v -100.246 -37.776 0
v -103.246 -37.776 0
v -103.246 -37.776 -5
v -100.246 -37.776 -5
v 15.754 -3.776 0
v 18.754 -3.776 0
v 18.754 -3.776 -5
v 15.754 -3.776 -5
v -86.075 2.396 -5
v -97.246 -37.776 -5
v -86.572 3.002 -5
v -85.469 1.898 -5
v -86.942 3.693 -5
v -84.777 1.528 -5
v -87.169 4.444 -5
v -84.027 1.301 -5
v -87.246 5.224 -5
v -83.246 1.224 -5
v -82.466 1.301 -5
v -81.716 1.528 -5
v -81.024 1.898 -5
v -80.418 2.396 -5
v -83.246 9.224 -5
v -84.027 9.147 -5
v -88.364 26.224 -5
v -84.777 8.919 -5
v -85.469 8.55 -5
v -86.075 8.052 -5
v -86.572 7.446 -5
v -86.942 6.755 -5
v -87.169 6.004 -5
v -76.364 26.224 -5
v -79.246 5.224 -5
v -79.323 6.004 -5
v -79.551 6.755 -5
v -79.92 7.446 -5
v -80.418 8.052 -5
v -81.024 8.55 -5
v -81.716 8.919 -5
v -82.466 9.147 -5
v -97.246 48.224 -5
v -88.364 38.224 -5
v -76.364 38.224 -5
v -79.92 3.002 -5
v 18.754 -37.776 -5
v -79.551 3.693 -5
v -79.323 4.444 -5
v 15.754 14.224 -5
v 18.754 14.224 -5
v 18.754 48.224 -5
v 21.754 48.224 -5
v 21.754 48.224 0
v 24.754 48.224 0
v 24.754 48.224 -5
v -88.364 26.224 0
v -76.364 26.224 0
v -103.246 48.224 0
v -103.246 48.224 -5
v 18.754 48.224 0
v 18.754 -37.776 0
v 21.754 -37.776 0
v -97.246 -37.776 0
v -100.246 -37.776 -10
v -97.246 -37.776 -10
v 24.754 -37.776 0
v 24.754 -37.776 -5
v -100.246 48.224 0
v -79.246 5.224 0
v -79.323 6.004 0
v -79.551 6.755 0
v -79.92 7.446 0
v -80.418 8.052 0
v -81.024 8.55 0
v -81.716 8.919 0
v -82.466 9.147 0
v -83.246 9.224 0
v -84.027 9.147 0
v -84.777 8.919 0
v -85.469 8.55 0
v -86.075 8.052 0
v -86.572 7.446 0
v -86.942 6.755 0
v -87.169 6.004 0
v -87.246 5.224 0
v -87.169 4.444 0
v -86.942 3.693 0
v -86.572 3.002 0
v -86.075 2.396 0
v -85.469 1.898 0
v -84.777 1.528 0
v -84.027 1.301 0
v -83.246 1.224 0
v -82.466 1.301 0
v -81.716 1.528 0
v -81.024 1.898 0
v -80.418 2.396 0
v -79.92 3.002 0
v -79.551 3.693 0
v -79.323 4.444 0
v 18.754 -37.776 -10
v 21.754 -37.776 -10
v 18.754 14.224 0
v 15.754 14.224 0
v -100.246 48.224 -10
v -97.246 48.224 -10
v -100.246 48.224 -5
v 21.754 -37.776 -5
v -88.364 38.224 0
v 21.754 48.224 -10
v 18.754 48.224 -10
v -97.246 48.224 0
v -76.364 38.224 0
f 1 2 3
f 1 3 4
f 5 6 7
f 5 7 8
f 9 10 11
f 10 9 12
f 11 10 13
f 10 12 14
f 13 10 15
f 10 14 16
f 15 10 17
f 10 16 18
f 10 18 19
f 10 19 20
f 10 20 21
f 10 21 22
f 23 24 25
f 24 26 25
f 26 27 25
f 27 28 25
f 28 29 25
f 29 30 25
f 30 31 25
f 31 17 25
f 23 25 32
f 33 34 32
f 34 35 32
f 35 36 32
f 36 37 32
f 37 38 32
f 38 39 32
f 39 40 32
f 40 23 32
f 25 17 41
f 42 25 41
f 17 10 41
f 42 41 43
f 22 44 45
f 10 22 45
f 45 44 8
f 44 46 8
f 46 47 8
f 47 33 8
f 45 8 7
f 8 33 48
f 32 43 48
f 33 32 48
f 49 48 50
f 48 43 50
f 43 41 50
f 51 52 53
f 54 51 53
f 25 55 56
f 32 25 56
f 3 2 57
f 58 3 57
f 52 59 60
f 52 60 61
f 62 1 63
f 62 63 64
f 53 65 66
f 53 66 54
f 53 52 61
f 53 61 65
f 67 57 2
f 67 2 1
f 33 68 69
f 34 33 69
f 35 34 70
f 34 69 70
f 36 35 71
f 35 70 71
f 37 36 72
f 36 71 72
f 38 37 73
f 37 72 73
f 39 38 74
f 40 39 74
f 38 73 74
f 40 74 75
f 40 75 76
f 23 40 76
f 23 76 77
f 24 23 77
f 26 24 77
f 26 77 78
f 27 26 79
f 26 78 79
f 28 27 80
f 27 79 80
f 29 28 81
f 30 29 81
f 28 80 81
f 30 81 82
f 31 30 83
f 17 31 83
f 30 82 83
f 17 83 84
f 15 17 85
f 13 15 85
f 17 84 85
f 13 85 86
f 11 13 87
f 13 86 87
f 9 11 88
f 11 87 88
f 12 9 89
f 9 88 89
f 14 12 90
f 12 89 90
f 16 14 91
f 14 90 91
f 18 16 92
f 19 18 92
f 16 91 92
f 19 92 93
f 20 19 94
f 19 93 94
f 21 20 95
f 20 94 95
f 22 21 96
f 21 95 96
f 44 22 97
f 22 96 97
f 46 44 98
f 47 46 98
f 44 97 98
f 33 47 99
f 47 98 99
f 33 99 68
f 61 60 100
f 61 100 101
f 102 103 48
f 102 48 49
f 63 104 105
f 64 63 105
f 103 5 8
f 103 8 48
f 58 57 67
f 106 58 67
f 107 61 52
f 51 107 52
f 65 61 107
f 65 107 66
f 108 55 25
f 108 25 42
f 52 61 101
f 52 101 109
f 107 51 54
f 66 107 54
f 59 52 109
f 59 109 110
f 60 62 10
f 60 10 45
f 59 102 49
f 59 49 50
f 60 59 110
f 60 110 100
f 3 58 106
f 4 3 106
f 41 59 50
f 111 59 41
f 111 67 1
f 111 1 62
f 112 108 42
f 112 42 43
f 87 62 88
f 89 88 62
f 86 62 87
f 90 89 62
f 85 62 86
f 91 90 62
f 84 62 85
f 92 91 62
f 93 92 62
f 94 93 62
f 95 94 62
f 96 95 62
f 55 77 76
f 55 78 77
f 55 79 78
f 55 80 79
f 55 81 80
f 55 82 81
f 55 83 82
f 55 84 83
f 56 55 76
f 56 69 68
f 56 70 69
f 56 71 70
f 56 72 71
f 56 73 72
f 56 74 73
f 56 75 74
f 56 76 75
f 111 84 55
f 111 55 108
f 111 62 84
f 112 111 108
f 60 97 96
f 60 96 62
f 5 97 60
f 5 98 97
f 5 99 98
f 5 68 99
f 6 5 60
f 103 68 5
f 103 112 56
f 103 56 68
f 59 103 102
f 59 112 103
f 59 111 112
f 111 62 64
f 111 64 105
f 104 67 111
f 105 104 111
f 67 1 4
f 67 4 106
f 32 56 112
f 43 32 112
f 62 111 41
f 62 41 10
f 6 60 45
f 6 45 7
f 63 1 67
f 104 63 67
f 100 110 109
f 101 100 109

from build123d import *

# Parameters (mm, degrees)
SKETCH_1_W        = 3
SKETCH_1_H        = 86
EXTRUDE_1_DEPTH   = 5
SKETCH_1_R        = 4
SKETCH_1_W_2      = 12
SKETCH_1_H_2      = 12
EXTRUDE_1_2_DEPTH = 5
EXTRUDE_1_3_DEPTH = 5
SKETCH_1_5_W      = 3
SKETCH_1_5_H      = 86
EXTRUDE_3_DEPTH   = 10
EXTRUDE_3_2_DEPTH = 10


with BuildPart() as part:
    # Эскиз1 → Бобышка-Вытянуть1 (new body)
    with BuildSketch(Plane.XY):
        with Locations((-101.746338848, 5.223963701)):
            Rectangle(SKETCH_1_W, SKETCH_1_H)
    extrude(amount=-EXTRUDE_1_DEPTH)


with BuildPart() as body_2:
    # Эскиз1 → Extrude 1 2 (new body)
    with BuildSketch(Plane.XY):
        Polygon((18.753661152, 48.223963701), (-97.246338848, 48.223963701), (-97.246338848, -37.776036299), (18.753661152, -37.776036299), (18.753661152, -3.776036299), (15.753661152, -3.776036299), (15.753661152, 14.223963701), (18.753661152, 14.223963701), align=None)
        with Locations((-83.246338848, 5.223963701)):
            Circle(SKETCH_1_R, mode=Mode.SUBTRACT)
        with Locations((-82.363885902, 32.223963701)):
            Rectangle(SKETCH_1_W_2, SKETCH_1_H_2, mode=Mode.SUBTRACT)
    extrude(amount=-EXTRUDE_1_2_DEPTH)


with BuildPart() as body_3:
    # Эскиз1 → Extrude 1 3 (new body)
    with BuildSketch(Plane.XY):
        with Locations((23.253661152, 5.223963701)):
            Rectangle(SKETCH_1_W, SKETCH_1_H)
    extrude(amount=-EXTRUDE_1_3_DEPTH)


with BuildPart() as body_4:
    # Эскиз1<5> → Бобышка-Вытянуть3 (new body)
    with BuildSketch(Plane.XY):
        with Locations((-98.746338848, 5.223963701)):
            Rectangle(SKETCH_1_5_W, SKETCH_1_5_H)
    extrude(amount=-EXTRUDE_3_DEPTH)


with BuildPart() as body_5:
    # Эскиз1<5> → Extrude 3 2 (new body)
    with BuildSketch(Plane.XY):
        with Locations((20.253661152, 5.223963701)):
            Rectangle(SKETCH_1_5_W, SKETCH_1_5_H)
    extrude(amount=-EXTRUDE_3_2_DEPTH)


solid = Compound([part.part, body_2.part, body_3.part, body_4.part, body_5.part])
